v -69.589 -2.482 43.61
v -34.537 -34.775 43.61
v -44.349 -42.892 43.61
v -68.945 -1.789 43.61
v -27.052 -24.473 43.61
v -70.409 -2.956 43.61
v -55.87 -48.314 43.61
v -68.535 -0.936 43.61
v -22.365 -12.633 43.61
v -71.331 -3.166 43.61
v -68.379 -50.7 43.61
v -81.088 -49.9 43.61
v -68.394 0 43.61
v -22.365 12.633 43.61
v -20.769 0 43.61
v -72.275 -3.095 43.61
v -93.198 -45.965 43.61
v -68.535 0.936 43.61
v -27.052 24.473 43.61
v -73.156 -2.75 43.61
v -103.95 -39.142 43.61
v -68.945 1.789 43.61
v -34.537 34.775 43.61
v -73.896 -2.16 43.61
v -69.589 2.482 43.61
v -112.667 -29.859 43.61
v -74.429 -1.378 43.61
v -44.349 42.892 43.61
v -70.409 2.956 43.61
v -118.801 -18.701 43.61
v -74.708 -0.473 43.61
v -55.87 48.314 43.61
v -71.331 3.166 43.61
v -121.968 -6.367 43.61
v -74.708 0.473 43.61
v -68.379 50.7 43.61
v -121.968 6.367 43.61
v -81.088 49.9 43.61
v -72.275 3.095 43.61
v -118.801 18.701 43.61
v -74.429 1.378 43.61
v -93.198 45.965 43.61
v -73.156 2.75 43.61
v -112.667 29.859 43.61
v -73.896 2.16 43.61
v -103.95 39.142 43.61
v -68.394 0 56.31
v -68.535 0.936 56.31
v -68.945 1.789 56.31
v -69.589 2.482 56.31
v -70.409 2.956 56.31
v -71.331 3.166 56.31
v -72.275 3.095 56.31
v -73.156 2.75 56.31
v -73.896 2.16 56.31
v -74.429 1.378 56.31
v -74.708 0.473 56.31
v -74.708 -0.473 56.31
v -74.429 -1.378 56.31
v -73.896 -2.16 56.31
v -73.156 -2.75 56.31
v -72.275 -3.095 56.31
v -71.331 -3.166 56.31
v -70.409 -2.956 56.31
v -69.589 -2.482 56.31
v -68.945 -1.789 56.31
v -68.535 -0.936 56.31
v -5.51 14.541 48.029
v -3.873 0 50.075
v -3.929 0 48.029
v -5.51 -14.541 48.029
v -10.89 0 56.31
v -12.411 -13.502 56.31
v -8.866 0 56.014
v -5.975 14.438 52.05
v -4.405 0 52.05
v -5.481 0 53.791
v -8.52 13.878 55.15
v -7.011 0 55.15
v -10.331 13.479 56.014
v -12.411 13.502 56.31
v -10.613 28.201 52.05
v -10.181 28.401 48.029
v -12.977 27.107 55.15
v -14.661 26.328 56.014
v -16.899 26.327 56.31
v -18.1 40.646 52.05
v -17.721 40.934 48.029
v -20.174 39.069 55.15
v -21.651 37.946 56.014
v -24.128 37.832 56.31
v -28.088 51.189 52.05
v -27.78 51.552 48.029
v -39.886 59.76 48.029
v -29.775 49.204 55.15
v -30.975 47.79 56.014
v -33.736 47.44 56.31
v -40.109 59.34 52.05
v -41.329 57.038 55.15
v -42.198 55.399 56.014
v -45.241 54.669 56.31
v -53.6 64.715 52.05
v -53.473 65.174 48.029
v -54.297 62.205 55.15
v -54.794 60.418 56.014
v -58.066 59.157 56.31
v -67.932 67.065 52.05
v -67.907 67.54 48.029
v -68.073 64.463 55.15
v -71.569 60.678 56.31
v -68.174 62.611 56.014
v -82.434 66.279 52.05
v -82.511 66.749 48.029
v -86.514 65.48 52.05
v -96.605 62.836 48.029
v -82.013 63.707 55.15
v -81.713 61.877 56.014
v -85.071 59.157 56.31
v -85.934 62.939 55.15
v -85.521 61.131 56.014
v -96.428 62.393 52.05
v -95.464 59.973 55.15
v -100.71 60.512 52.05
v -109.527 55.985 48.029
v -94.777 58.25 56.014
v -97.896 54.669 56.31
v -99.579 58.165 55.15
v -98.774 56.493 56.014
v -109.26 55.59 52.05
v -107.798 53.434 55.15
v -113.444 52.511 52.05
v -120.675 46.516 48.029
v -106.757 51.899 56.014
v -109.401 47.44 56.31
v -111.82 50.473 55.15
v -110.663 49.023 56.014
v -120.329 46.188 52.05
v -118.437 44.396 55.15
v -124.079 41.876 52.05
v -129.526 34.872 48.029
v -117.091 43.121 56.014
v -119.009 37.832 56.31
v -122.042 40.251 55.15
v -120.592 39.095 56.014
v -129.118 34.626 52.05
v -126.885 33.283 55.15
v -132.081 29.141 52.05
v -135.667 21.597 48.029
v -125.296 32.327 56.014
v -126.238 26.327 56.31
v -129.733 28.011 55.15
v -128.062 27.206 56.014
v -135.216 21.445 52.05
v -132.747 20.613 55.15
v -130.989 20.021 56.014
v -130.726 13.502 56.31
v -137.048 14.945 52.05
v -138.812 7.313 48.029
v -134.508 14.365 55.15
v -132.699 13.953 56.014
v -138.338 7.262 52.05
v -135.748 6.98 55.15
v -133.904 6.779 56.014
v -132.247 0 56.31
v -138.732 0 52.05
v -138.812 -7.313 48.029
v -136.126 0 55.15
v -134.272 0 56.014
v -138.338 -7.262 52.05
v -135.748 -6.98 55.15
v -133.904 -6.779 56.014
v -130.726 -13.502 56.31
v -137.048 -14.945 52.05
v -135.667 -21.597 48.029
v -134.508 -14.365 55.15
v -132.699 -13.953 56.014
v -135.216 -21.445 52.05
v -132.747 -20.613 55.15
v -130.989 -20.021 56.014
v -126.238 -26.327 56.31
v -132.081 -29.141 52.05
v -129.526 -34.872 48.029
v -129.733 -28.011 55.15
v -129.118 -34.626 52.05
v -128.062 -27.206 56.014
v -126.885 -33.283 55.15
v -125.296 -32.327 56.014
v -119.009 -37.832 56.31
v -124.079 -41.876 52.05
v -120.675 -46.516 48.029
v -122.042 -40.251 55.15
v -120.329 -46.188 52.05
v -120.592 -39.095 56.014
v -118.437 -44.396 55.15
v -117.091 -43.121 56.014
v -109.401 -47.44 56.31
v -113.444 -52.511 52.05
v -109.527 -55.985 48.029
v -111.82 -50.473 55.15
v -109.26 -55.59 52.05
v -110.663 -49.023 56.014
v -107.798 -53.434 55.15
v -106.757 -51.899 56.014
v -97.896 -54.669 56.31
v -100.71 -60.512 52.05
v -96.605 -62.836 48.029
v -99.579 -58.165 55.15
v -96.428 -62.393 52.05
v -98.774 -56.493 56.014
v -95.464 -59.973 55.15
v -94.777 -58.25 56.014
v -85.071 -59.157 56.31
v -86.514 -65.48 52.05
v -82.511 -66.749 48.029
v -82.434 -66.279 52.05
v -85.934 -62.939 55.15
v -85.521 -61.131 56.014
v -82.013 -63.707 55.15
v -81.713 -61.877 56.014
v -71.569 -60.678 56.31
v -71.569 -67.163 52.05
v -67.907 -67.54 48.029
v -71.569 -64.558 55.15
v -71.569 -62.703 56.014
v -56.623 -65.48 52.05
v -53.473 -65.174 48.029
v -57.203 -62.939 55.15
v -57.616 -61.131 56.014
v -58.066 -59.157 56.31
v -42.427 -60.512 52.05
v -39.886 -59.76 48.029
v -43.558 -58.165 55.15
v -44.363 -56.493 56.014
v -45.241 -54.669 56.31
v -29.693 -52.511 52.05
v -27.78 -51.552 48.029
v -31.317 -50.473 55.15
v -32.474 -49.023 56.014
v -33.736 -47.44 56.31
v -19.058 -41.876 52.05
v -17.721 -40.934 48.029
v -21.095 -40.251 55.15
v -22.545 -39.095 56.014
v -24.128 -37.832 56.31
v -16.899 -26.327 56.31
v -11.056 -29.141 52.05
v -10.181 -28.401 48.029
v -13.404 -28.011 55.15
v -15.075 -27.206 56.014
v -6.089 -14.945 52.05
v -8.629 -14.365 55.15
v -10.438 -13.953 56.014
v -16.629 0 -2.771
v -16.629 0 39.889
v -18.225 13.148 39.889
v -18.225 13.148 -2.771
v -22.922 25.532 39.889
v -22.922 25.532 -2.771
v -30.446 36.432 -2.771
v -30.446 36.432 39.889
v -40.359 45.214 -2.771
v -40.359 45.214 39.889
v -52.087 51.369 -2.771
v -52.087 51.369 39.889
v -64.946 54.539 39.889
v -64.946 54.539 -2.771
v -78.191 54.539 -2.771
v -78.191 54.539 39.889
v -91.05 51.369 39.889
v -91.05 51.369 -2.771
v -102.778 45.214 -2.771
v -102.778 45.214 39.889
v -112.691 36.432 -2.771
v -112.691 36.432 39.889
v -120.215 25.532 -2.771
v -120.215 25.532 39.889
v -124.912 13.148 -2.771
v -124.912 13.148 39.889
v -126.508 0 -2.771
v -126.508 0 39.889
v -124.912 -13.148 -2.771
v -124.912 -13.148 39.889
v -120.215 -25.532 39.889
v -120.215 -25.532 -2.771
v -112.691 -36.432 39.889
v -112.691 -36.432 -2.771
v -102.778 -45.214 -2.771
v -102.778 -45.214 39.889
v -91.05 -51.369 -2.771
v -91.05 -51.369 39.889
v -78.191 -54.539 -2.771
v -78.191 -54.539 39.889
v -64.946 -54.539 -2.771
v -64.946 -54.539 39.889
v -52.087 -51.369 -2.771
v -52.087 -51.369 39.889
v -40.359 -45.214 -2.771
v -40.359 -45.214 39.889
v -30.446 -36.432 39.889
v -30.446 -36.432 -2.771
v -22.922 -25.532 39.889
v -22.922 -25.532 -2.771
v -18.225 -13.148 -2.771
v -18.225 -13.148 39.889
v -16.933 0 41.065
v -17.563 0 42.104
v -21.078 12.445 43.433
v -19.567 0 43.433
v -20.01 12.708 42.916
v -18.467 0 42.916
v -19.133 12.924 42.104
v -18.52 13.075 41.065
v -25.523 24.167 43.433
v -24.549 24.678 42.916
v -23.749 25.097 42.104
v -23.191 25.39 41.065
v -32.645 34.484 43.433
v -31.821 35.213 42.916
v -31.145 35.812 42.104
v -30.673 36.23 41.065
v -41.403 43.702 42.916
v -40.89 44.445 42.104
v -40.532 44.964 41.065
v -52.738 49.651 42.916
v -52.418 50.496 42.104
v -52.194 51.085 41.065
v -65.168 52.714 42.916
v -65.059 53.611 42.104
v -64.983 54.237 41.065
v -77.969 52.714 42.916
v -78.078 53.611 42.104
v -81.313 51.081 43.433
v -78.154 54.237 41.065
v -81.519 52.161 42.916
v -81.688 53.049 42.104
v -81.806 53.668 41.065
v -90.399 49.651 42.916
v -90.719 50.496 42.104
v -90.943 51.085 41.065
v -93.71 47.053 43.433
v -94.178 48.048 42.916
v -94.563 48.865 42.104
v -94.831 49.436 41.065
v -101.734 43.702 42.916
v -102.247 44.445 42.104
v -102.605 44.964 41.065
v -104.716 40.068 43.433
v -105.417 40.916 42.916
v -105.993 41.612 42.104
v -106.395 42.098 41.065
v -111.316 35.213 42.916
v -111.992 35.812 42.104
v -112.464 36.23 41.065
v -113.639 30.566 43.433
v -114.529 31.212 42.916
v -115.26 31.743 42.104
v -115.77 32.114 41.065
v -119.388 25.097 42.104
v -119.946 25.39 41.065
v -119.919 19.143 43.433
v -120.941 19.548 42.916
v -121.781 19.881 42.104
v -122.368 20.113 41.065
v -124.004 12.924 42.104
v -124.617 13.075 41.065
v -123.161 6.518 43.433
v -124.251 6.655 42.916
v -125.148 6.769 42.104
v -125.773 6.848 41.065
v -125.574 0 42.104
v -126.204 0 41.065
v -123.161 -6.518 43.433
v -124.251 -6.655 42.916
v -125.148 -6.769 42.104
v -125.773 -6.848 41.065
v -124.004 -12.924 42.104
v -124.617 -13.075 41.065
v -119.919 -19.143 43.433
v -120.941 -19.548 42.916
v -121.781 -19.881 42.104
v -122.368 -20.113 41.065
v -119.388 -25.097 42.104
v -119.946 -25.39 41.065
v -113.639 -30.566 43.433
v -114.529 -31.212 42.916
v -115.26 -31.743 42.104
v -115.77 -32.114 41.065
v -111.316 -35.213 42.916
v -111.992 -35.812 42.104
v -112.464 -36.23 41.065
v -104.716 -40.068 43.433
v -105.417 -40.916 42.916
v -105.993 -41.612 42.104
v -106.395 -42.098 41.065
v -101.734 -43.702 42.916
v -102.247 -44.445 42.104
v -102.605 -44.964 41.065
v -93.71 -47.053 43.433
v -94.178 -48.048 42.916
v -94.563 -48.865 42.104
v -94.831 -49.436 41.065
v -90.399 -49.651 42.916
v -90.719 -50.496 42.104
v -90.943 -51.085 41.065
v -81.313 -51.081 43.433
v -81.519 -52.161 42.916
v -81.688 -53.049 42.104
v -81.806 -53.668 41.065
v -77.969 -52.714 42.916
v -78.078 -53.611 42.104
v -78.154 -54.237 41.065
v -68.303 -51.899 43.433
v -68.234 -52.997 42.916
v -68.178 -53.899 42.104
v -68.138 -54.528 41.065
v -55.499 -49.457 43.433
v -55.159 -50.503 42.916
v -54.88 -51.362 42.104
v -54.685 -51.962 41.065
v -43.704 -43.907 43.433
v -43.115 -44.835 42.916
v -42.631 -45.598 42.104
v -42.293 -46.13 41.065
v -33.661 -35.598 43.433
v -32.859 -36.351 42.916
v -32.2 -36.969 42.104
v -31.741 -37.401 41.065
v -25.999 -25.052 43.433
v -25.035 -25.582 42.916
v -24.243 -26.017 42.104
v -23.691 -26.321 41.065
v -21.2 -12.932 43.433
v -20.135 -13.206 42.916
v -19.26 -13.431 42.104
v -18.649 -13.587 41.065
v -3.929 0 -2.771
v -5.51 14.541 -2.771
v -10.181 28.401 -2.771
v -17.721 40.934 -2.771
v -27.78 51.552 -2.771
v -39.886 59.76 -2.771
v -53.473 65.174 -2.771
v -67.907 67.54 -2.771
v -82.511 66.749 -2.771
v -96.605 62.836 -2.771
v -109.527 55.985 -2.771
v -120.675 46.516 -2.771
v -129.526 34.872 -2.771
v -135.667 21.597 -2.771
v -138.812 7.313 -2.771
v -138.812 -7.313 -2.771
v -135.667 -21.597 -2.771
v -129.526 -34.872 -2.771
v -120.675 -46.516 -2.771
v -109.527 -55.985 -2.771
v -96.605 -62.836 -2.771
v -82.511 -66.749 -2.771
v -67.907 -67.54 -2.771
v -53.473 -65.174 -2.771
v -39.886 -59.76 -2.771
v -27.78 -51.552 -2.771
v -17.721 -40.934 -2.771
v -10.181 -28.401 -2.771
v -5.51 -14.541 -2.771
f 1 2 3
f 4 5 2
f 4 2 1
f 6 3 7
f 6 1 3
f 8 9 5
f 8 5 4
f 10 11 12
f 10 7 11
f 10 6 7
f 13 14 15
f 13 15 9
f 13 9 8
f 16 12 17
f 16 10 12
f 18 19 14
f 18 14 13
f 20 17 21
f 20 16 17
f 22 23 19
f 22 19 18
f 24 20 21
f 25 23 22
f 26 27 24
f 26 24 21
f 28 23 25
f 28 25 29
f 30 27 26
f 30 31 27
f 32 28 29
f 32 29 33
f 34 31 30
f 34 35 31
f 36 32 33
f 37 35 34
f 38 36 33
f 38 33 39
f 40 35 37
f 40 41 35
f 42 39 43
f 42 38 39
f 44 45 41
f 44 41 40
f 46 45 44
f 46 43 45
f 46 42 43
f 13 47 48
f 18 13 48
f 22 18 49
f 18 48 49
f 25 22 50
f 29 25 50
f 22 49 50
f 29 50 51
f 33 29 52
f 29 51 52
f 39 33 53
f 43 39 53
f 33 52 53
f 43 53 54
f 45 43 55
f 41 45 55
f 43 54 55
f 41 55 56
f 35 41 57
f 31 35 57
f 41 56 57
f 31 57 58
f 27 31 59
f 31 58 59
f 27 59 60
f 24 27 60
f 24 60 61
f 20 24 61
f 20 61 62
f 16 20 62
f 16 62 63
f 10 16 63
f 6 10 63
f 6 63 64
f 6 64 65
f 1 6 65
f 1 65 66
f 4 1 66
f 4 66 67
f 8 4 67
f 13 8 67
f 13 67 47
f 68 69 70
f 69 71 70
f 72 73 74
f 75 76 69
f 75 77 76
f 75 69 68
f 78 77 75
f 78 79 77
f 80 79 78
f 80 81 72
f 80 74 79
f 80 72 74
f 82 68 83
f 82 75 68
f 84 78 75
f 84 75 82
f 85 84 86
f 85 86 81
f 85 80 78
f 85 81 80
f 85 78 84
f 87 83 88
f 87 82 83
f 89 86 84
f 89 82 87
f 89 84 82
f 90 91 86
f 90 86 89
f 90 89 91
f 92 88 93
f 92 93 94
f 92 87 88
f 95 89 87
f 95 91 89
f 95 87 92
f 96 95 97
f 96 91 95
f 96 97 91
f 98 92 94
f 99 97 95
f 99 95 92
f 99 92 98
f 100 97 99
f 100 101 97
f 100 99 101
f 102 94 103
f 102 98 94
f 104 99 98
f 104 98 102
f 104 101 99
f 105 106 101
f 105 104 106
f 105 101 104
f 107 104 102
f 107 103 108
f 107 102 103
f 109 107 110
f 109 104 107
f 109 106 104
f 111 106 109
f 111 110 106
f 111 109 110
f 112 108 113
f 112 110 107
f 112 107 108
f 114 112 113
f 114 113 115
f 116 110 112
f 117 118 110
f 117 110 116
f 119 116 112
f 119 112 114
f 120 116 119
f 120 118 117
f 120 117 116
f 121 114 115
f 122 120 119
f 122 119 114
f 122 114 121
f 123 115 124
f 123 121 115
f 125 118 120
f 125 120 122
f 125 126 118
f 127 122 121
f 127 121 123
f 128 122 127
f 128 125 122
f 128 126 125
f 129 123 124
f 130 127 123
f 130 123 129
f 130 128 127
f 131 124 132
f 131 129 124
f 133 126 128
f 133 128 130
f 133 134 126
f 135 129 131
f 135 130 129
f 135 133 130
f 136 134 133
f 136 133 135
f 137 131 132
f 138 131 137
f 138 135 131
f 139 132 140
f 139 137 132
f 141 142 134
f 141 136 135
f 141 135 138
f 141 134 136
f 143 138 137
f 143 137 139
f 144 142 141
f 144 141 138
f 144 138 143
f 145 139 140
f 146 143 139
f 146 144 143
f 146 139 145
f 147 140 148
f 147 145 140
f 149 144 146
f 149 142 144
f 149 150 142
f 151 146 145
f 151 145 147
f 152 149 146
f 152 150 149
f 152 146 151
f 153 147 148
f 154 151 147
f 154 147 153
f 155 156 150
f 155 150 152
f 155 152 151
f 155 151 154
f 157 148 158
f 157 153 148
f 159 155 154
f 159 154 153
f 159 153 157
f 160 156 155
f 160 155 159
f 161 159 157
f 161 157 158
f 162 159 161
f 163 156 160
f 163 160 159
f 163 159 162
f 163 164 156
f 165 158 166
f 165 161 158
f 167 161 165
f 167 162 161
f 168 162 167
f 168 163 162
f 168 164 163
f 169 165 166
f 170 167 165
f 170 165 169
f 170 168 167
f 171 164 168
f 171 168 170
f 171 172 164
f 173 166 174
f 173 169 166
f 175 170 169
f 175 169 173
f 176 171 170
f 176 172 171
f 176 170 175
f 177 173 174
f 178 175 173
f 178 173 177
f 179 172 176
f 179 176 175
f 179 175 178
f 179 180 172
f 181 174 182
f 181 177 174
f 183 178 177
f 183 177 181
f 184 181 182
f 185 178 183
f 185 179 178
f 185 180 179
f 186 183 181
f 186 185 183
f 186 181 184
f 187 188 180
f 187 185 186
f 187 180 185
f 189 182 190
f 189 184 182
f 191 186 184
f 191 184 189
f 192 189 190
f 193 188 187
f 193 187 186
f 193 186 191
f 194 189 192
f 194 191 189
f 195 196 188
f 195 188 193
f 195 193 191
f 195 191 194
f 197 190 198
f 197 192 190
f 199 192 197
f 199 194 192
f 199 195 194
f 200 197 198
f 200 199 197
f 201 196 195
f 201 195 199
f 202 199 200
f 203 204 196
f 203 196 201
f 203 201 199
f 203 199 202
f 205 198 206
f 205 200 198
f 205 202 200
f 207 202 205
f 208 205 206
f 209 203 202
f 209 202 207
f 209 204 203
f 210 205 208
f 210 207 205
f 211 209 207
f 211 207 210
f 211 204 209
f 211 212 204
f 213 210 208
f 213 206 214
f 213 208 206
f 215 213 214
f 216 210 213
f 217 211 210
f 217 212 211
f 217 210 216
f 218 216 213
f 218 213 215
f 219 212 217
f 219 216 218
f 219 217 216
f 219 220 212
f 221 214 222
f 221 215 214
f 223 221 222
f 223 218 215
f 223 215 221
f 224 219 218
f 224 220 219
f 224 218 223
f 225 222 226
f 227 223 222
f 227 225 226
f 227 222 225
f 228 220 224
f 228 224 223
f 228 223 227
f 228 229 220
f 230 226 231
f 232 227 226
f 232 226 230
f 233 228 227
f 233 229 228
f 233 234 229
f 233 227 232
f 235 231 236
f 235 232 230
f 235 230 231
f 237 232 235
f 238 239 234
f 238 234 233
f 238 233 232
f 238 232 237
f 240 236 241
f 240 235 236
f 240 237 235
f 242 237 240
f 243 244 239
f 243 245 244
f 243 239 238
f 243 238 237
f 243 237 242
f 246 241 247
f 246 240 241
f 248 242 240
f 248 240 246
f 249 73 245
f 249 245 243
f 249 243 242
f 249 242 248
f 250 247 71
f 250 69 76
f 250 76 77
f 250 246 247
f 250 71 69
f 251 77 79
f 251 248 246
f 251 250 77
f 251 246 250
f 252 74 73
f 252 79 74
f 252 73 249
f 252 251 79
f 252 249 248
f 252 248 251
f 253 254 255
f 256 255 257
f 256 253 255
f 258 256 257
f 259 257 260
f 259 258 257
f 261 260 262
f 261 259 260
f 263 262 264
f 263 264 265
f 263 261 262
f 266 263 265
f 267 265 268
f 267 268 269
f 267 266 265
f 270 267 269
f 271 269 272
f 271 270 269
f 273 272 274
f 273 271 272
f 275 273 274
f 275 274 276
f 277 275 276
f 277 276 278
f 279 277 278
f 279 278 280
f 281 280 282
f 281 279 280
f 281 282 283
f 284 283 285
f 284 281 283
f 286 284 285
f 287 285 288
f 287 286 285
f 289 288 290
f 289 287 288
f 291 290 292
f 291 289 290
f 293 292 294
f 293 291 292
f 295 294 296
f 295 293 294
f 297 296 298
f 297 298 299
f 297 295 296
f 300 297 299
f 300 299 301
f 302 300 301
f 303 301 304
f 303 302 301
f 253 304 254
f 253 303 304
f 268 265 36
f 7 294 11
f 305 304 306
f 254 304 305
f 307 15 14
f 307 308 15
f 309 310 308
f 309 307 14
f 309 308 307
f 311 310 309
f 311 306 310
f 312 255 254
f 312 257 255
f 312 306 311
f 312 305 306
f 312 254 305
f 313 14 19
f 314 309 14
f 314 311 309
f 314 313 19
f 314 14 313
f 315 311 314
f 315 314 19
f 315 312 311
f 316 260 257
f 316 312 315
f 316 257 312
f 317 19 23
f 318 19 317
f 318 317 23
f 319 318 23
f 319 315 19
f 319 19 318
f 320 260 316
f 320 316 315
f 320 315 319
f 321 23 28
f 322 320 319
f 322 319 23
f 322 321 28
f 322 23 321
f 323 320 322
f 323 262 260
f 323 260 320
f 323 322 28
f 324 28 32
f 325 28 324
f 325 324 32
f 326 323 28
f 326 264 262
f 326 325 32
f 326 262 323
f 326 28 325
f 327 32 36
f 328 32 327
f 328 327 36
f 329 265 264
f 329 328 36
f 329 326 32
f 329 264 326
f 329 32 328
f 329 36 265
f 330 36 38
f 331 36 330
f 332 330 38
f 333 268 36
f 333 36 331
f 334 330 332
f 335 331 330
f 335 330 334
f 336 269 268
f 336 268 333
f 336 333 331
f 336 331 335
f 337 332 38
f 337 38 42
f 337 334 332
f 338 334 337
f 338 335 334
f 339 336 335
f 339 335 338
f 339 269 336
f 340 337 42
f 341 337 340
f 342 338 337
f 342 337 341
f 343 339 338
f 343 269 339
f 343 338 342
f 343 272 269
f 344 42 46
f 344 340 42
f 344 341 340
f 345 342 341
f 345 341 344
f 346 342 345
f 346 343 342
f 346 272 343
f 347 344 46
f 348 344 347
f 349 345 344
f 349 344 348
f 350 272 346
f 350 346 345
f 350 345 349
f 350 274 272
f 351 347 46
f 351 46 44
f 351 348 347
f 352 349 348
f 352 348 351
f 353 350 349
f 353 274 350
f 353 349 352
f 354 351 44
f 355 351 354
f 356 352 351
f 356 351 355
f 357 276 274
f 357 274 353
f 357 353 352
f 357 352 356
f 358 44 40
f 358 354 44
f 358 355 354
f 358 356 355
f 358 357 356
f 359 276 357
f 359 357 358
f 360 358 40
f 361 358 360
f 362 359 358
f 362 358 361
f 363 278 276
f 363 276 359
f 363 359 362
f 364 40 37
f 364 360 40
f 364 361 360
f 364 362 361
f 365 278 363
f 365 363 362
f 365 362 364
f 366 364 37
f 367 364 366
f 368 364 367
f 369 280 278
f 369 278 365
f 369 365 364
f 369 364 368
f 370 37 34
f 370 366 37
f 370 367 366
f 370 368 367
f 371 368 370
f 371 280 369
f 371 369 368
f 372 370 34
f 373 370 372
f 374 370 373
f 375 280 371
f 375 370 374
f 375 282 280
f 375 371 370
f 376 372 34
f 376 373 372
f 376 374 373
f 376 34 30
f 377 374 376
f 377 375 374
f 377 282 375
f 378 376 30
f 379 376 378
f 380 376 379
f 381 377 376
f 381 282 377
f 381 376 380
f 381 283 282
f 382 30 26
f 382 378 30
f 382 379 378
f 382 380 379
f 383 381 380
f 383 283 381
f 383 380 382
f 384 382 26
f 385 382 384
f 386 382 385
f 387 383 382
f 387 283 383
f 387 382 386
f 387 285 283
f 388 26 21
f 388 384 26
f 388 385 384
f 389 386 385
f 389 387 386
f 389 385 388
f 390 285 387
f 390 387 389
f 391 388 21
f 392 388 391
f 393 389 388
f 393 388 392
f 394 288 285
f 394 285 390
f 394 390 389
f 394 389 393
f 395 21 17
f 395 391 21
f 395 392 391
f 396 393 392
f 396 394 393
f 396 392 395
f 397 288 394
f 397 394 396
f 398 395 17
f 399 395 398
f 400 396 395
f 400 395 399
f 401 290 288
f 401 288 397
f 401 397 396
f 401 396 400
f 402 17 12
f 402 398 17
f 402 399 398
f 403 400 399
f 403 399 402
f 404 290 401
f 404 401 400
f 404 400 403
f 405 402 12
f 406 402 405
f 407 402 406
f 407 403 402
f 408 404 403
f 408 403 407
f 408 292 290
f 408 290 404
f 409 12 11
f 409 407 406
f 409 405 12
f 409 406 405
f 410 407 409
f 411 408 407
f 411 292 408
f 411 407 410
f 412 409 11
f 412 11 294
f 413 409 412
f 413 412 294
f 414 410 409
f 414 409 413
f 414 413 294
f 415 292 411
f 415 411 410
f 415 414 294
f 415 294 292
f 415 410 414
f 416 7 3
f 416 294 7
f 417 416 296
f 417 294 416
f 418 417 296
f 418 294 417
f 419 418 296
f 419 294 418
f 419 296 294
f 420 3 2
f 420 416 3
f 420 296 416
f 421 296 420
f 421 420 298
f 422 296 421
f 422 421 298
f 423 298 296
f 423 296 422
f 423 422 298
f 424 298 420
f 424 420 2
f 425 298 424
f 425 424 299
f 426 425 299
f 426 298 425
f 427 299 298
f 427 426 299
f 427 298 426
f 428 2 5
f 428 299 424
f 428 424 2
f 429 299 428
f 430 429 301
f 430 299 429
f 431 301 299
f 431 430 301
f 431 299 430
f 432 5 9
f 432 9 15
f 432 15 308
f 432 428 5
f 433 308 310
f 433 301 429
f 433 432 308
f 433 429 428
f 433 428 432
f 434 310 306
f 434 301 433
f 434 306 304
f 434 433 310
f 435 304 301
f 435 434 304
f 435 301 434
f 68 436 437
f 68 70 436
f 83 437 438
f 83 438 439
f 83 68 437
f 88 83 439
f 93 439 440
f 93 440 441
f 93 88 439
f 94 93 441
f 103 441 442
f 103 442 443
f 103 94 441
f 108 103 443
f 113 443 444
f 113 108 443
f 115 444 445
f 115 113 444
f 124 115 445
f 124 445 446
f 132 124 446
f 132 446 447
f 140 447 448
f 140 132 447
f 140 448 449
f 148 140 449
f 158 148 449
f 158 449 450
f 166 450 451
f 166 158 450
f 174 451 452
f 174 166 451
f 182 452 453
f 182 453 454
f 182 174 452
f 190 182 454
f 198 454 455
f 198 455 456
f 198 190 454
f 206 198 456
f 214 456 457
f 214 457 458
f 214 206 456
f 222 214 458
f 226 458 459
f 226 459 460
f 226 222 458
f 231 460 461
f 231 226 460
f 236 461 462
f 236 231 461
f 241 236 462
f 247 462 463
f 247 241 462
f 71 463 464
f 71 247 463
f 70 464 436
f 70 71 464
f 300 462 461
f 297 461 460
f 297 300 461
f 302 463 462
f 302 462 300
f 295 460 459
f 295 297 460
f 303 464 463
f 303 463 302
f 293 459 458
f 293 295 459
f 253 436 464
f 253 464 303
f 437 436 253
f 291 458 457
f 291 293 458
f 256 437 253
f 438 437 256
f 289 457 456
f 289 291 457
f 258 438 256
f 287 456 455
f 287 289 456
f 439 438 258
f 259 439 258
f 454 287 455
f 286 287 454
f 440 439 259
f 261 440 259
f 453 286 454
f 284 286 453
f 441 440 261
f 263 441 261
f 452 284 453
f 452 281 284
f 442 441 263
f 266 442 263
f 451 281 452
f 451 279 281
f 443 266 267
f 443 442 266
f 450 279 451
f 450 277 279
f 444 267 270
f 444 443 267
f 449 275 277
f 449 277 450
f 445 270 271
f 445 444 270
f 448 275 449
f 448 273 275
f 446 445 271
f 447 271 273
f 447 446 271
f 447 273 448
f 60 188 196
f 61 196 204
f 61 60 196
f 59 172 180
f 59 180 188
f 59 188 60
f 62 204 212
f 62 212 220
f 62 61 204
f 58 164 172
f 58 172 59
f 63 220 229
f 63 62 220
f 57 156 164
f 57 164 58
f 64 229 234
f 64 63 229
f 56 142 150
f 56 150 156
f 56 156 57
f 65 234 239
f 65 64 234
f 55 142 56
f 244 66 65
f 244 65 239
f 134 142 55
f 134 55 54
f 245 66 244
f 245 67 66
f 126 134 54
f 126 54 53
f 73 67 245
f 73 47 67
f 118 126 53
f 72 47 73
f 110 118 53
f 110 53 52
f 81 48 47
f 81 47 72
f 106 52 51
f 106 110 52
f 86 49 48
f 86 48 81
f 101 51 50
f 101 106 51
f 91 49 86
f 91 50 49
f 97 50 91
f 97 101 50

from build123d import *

# Parameters (mm, degrees)
F2_R     = 3.175
F3_DEPTH = 25.4


with BuildPart() as f1:
    # F0 (on Front) → F1 (revolve)
    with BuildSketch(Plane.XZ):
        with BuildLine():
            Line((-71.568562, 56.310103), (-71.568562, 43.610103))
            Line((-71.568562, 43.610103), (-20.768562, 43.610103))
            ThreePointArc((-20.768562, 43.610103), (-17.985365, 42.542987), (-16.629005, 39.888706))
            Line((-16.629005, 39.888706), (-16.629005, -2.770737))
            Line((-16.629005, -2.770737), (-3.929005, -2.770737))
            Line((-3.929005, -2.770737), (-3.929005, 48.029263))
            ThreePointArc((-3.929005, 48.029263), (-5.481125, 53.790795), (-10.890138, 56.310103))
            Line((-10.890138, 56.310103), (-71.568562, 56.310103))
        make_face()
    revolve(axis=Axis((-71.568562, 0, 49.960103), (0, 0, 1)))

    # F2 (on face) → F3 (cut)
    with BuildSketch(Plane.XY.offset(56.310103)):
        with Locations((-71.568562, 0)):
            Circle(F2_R)
    extrude(amount=-F3_DEPTH, mode=Mode.SUBTRACT)


solid = f1.part
